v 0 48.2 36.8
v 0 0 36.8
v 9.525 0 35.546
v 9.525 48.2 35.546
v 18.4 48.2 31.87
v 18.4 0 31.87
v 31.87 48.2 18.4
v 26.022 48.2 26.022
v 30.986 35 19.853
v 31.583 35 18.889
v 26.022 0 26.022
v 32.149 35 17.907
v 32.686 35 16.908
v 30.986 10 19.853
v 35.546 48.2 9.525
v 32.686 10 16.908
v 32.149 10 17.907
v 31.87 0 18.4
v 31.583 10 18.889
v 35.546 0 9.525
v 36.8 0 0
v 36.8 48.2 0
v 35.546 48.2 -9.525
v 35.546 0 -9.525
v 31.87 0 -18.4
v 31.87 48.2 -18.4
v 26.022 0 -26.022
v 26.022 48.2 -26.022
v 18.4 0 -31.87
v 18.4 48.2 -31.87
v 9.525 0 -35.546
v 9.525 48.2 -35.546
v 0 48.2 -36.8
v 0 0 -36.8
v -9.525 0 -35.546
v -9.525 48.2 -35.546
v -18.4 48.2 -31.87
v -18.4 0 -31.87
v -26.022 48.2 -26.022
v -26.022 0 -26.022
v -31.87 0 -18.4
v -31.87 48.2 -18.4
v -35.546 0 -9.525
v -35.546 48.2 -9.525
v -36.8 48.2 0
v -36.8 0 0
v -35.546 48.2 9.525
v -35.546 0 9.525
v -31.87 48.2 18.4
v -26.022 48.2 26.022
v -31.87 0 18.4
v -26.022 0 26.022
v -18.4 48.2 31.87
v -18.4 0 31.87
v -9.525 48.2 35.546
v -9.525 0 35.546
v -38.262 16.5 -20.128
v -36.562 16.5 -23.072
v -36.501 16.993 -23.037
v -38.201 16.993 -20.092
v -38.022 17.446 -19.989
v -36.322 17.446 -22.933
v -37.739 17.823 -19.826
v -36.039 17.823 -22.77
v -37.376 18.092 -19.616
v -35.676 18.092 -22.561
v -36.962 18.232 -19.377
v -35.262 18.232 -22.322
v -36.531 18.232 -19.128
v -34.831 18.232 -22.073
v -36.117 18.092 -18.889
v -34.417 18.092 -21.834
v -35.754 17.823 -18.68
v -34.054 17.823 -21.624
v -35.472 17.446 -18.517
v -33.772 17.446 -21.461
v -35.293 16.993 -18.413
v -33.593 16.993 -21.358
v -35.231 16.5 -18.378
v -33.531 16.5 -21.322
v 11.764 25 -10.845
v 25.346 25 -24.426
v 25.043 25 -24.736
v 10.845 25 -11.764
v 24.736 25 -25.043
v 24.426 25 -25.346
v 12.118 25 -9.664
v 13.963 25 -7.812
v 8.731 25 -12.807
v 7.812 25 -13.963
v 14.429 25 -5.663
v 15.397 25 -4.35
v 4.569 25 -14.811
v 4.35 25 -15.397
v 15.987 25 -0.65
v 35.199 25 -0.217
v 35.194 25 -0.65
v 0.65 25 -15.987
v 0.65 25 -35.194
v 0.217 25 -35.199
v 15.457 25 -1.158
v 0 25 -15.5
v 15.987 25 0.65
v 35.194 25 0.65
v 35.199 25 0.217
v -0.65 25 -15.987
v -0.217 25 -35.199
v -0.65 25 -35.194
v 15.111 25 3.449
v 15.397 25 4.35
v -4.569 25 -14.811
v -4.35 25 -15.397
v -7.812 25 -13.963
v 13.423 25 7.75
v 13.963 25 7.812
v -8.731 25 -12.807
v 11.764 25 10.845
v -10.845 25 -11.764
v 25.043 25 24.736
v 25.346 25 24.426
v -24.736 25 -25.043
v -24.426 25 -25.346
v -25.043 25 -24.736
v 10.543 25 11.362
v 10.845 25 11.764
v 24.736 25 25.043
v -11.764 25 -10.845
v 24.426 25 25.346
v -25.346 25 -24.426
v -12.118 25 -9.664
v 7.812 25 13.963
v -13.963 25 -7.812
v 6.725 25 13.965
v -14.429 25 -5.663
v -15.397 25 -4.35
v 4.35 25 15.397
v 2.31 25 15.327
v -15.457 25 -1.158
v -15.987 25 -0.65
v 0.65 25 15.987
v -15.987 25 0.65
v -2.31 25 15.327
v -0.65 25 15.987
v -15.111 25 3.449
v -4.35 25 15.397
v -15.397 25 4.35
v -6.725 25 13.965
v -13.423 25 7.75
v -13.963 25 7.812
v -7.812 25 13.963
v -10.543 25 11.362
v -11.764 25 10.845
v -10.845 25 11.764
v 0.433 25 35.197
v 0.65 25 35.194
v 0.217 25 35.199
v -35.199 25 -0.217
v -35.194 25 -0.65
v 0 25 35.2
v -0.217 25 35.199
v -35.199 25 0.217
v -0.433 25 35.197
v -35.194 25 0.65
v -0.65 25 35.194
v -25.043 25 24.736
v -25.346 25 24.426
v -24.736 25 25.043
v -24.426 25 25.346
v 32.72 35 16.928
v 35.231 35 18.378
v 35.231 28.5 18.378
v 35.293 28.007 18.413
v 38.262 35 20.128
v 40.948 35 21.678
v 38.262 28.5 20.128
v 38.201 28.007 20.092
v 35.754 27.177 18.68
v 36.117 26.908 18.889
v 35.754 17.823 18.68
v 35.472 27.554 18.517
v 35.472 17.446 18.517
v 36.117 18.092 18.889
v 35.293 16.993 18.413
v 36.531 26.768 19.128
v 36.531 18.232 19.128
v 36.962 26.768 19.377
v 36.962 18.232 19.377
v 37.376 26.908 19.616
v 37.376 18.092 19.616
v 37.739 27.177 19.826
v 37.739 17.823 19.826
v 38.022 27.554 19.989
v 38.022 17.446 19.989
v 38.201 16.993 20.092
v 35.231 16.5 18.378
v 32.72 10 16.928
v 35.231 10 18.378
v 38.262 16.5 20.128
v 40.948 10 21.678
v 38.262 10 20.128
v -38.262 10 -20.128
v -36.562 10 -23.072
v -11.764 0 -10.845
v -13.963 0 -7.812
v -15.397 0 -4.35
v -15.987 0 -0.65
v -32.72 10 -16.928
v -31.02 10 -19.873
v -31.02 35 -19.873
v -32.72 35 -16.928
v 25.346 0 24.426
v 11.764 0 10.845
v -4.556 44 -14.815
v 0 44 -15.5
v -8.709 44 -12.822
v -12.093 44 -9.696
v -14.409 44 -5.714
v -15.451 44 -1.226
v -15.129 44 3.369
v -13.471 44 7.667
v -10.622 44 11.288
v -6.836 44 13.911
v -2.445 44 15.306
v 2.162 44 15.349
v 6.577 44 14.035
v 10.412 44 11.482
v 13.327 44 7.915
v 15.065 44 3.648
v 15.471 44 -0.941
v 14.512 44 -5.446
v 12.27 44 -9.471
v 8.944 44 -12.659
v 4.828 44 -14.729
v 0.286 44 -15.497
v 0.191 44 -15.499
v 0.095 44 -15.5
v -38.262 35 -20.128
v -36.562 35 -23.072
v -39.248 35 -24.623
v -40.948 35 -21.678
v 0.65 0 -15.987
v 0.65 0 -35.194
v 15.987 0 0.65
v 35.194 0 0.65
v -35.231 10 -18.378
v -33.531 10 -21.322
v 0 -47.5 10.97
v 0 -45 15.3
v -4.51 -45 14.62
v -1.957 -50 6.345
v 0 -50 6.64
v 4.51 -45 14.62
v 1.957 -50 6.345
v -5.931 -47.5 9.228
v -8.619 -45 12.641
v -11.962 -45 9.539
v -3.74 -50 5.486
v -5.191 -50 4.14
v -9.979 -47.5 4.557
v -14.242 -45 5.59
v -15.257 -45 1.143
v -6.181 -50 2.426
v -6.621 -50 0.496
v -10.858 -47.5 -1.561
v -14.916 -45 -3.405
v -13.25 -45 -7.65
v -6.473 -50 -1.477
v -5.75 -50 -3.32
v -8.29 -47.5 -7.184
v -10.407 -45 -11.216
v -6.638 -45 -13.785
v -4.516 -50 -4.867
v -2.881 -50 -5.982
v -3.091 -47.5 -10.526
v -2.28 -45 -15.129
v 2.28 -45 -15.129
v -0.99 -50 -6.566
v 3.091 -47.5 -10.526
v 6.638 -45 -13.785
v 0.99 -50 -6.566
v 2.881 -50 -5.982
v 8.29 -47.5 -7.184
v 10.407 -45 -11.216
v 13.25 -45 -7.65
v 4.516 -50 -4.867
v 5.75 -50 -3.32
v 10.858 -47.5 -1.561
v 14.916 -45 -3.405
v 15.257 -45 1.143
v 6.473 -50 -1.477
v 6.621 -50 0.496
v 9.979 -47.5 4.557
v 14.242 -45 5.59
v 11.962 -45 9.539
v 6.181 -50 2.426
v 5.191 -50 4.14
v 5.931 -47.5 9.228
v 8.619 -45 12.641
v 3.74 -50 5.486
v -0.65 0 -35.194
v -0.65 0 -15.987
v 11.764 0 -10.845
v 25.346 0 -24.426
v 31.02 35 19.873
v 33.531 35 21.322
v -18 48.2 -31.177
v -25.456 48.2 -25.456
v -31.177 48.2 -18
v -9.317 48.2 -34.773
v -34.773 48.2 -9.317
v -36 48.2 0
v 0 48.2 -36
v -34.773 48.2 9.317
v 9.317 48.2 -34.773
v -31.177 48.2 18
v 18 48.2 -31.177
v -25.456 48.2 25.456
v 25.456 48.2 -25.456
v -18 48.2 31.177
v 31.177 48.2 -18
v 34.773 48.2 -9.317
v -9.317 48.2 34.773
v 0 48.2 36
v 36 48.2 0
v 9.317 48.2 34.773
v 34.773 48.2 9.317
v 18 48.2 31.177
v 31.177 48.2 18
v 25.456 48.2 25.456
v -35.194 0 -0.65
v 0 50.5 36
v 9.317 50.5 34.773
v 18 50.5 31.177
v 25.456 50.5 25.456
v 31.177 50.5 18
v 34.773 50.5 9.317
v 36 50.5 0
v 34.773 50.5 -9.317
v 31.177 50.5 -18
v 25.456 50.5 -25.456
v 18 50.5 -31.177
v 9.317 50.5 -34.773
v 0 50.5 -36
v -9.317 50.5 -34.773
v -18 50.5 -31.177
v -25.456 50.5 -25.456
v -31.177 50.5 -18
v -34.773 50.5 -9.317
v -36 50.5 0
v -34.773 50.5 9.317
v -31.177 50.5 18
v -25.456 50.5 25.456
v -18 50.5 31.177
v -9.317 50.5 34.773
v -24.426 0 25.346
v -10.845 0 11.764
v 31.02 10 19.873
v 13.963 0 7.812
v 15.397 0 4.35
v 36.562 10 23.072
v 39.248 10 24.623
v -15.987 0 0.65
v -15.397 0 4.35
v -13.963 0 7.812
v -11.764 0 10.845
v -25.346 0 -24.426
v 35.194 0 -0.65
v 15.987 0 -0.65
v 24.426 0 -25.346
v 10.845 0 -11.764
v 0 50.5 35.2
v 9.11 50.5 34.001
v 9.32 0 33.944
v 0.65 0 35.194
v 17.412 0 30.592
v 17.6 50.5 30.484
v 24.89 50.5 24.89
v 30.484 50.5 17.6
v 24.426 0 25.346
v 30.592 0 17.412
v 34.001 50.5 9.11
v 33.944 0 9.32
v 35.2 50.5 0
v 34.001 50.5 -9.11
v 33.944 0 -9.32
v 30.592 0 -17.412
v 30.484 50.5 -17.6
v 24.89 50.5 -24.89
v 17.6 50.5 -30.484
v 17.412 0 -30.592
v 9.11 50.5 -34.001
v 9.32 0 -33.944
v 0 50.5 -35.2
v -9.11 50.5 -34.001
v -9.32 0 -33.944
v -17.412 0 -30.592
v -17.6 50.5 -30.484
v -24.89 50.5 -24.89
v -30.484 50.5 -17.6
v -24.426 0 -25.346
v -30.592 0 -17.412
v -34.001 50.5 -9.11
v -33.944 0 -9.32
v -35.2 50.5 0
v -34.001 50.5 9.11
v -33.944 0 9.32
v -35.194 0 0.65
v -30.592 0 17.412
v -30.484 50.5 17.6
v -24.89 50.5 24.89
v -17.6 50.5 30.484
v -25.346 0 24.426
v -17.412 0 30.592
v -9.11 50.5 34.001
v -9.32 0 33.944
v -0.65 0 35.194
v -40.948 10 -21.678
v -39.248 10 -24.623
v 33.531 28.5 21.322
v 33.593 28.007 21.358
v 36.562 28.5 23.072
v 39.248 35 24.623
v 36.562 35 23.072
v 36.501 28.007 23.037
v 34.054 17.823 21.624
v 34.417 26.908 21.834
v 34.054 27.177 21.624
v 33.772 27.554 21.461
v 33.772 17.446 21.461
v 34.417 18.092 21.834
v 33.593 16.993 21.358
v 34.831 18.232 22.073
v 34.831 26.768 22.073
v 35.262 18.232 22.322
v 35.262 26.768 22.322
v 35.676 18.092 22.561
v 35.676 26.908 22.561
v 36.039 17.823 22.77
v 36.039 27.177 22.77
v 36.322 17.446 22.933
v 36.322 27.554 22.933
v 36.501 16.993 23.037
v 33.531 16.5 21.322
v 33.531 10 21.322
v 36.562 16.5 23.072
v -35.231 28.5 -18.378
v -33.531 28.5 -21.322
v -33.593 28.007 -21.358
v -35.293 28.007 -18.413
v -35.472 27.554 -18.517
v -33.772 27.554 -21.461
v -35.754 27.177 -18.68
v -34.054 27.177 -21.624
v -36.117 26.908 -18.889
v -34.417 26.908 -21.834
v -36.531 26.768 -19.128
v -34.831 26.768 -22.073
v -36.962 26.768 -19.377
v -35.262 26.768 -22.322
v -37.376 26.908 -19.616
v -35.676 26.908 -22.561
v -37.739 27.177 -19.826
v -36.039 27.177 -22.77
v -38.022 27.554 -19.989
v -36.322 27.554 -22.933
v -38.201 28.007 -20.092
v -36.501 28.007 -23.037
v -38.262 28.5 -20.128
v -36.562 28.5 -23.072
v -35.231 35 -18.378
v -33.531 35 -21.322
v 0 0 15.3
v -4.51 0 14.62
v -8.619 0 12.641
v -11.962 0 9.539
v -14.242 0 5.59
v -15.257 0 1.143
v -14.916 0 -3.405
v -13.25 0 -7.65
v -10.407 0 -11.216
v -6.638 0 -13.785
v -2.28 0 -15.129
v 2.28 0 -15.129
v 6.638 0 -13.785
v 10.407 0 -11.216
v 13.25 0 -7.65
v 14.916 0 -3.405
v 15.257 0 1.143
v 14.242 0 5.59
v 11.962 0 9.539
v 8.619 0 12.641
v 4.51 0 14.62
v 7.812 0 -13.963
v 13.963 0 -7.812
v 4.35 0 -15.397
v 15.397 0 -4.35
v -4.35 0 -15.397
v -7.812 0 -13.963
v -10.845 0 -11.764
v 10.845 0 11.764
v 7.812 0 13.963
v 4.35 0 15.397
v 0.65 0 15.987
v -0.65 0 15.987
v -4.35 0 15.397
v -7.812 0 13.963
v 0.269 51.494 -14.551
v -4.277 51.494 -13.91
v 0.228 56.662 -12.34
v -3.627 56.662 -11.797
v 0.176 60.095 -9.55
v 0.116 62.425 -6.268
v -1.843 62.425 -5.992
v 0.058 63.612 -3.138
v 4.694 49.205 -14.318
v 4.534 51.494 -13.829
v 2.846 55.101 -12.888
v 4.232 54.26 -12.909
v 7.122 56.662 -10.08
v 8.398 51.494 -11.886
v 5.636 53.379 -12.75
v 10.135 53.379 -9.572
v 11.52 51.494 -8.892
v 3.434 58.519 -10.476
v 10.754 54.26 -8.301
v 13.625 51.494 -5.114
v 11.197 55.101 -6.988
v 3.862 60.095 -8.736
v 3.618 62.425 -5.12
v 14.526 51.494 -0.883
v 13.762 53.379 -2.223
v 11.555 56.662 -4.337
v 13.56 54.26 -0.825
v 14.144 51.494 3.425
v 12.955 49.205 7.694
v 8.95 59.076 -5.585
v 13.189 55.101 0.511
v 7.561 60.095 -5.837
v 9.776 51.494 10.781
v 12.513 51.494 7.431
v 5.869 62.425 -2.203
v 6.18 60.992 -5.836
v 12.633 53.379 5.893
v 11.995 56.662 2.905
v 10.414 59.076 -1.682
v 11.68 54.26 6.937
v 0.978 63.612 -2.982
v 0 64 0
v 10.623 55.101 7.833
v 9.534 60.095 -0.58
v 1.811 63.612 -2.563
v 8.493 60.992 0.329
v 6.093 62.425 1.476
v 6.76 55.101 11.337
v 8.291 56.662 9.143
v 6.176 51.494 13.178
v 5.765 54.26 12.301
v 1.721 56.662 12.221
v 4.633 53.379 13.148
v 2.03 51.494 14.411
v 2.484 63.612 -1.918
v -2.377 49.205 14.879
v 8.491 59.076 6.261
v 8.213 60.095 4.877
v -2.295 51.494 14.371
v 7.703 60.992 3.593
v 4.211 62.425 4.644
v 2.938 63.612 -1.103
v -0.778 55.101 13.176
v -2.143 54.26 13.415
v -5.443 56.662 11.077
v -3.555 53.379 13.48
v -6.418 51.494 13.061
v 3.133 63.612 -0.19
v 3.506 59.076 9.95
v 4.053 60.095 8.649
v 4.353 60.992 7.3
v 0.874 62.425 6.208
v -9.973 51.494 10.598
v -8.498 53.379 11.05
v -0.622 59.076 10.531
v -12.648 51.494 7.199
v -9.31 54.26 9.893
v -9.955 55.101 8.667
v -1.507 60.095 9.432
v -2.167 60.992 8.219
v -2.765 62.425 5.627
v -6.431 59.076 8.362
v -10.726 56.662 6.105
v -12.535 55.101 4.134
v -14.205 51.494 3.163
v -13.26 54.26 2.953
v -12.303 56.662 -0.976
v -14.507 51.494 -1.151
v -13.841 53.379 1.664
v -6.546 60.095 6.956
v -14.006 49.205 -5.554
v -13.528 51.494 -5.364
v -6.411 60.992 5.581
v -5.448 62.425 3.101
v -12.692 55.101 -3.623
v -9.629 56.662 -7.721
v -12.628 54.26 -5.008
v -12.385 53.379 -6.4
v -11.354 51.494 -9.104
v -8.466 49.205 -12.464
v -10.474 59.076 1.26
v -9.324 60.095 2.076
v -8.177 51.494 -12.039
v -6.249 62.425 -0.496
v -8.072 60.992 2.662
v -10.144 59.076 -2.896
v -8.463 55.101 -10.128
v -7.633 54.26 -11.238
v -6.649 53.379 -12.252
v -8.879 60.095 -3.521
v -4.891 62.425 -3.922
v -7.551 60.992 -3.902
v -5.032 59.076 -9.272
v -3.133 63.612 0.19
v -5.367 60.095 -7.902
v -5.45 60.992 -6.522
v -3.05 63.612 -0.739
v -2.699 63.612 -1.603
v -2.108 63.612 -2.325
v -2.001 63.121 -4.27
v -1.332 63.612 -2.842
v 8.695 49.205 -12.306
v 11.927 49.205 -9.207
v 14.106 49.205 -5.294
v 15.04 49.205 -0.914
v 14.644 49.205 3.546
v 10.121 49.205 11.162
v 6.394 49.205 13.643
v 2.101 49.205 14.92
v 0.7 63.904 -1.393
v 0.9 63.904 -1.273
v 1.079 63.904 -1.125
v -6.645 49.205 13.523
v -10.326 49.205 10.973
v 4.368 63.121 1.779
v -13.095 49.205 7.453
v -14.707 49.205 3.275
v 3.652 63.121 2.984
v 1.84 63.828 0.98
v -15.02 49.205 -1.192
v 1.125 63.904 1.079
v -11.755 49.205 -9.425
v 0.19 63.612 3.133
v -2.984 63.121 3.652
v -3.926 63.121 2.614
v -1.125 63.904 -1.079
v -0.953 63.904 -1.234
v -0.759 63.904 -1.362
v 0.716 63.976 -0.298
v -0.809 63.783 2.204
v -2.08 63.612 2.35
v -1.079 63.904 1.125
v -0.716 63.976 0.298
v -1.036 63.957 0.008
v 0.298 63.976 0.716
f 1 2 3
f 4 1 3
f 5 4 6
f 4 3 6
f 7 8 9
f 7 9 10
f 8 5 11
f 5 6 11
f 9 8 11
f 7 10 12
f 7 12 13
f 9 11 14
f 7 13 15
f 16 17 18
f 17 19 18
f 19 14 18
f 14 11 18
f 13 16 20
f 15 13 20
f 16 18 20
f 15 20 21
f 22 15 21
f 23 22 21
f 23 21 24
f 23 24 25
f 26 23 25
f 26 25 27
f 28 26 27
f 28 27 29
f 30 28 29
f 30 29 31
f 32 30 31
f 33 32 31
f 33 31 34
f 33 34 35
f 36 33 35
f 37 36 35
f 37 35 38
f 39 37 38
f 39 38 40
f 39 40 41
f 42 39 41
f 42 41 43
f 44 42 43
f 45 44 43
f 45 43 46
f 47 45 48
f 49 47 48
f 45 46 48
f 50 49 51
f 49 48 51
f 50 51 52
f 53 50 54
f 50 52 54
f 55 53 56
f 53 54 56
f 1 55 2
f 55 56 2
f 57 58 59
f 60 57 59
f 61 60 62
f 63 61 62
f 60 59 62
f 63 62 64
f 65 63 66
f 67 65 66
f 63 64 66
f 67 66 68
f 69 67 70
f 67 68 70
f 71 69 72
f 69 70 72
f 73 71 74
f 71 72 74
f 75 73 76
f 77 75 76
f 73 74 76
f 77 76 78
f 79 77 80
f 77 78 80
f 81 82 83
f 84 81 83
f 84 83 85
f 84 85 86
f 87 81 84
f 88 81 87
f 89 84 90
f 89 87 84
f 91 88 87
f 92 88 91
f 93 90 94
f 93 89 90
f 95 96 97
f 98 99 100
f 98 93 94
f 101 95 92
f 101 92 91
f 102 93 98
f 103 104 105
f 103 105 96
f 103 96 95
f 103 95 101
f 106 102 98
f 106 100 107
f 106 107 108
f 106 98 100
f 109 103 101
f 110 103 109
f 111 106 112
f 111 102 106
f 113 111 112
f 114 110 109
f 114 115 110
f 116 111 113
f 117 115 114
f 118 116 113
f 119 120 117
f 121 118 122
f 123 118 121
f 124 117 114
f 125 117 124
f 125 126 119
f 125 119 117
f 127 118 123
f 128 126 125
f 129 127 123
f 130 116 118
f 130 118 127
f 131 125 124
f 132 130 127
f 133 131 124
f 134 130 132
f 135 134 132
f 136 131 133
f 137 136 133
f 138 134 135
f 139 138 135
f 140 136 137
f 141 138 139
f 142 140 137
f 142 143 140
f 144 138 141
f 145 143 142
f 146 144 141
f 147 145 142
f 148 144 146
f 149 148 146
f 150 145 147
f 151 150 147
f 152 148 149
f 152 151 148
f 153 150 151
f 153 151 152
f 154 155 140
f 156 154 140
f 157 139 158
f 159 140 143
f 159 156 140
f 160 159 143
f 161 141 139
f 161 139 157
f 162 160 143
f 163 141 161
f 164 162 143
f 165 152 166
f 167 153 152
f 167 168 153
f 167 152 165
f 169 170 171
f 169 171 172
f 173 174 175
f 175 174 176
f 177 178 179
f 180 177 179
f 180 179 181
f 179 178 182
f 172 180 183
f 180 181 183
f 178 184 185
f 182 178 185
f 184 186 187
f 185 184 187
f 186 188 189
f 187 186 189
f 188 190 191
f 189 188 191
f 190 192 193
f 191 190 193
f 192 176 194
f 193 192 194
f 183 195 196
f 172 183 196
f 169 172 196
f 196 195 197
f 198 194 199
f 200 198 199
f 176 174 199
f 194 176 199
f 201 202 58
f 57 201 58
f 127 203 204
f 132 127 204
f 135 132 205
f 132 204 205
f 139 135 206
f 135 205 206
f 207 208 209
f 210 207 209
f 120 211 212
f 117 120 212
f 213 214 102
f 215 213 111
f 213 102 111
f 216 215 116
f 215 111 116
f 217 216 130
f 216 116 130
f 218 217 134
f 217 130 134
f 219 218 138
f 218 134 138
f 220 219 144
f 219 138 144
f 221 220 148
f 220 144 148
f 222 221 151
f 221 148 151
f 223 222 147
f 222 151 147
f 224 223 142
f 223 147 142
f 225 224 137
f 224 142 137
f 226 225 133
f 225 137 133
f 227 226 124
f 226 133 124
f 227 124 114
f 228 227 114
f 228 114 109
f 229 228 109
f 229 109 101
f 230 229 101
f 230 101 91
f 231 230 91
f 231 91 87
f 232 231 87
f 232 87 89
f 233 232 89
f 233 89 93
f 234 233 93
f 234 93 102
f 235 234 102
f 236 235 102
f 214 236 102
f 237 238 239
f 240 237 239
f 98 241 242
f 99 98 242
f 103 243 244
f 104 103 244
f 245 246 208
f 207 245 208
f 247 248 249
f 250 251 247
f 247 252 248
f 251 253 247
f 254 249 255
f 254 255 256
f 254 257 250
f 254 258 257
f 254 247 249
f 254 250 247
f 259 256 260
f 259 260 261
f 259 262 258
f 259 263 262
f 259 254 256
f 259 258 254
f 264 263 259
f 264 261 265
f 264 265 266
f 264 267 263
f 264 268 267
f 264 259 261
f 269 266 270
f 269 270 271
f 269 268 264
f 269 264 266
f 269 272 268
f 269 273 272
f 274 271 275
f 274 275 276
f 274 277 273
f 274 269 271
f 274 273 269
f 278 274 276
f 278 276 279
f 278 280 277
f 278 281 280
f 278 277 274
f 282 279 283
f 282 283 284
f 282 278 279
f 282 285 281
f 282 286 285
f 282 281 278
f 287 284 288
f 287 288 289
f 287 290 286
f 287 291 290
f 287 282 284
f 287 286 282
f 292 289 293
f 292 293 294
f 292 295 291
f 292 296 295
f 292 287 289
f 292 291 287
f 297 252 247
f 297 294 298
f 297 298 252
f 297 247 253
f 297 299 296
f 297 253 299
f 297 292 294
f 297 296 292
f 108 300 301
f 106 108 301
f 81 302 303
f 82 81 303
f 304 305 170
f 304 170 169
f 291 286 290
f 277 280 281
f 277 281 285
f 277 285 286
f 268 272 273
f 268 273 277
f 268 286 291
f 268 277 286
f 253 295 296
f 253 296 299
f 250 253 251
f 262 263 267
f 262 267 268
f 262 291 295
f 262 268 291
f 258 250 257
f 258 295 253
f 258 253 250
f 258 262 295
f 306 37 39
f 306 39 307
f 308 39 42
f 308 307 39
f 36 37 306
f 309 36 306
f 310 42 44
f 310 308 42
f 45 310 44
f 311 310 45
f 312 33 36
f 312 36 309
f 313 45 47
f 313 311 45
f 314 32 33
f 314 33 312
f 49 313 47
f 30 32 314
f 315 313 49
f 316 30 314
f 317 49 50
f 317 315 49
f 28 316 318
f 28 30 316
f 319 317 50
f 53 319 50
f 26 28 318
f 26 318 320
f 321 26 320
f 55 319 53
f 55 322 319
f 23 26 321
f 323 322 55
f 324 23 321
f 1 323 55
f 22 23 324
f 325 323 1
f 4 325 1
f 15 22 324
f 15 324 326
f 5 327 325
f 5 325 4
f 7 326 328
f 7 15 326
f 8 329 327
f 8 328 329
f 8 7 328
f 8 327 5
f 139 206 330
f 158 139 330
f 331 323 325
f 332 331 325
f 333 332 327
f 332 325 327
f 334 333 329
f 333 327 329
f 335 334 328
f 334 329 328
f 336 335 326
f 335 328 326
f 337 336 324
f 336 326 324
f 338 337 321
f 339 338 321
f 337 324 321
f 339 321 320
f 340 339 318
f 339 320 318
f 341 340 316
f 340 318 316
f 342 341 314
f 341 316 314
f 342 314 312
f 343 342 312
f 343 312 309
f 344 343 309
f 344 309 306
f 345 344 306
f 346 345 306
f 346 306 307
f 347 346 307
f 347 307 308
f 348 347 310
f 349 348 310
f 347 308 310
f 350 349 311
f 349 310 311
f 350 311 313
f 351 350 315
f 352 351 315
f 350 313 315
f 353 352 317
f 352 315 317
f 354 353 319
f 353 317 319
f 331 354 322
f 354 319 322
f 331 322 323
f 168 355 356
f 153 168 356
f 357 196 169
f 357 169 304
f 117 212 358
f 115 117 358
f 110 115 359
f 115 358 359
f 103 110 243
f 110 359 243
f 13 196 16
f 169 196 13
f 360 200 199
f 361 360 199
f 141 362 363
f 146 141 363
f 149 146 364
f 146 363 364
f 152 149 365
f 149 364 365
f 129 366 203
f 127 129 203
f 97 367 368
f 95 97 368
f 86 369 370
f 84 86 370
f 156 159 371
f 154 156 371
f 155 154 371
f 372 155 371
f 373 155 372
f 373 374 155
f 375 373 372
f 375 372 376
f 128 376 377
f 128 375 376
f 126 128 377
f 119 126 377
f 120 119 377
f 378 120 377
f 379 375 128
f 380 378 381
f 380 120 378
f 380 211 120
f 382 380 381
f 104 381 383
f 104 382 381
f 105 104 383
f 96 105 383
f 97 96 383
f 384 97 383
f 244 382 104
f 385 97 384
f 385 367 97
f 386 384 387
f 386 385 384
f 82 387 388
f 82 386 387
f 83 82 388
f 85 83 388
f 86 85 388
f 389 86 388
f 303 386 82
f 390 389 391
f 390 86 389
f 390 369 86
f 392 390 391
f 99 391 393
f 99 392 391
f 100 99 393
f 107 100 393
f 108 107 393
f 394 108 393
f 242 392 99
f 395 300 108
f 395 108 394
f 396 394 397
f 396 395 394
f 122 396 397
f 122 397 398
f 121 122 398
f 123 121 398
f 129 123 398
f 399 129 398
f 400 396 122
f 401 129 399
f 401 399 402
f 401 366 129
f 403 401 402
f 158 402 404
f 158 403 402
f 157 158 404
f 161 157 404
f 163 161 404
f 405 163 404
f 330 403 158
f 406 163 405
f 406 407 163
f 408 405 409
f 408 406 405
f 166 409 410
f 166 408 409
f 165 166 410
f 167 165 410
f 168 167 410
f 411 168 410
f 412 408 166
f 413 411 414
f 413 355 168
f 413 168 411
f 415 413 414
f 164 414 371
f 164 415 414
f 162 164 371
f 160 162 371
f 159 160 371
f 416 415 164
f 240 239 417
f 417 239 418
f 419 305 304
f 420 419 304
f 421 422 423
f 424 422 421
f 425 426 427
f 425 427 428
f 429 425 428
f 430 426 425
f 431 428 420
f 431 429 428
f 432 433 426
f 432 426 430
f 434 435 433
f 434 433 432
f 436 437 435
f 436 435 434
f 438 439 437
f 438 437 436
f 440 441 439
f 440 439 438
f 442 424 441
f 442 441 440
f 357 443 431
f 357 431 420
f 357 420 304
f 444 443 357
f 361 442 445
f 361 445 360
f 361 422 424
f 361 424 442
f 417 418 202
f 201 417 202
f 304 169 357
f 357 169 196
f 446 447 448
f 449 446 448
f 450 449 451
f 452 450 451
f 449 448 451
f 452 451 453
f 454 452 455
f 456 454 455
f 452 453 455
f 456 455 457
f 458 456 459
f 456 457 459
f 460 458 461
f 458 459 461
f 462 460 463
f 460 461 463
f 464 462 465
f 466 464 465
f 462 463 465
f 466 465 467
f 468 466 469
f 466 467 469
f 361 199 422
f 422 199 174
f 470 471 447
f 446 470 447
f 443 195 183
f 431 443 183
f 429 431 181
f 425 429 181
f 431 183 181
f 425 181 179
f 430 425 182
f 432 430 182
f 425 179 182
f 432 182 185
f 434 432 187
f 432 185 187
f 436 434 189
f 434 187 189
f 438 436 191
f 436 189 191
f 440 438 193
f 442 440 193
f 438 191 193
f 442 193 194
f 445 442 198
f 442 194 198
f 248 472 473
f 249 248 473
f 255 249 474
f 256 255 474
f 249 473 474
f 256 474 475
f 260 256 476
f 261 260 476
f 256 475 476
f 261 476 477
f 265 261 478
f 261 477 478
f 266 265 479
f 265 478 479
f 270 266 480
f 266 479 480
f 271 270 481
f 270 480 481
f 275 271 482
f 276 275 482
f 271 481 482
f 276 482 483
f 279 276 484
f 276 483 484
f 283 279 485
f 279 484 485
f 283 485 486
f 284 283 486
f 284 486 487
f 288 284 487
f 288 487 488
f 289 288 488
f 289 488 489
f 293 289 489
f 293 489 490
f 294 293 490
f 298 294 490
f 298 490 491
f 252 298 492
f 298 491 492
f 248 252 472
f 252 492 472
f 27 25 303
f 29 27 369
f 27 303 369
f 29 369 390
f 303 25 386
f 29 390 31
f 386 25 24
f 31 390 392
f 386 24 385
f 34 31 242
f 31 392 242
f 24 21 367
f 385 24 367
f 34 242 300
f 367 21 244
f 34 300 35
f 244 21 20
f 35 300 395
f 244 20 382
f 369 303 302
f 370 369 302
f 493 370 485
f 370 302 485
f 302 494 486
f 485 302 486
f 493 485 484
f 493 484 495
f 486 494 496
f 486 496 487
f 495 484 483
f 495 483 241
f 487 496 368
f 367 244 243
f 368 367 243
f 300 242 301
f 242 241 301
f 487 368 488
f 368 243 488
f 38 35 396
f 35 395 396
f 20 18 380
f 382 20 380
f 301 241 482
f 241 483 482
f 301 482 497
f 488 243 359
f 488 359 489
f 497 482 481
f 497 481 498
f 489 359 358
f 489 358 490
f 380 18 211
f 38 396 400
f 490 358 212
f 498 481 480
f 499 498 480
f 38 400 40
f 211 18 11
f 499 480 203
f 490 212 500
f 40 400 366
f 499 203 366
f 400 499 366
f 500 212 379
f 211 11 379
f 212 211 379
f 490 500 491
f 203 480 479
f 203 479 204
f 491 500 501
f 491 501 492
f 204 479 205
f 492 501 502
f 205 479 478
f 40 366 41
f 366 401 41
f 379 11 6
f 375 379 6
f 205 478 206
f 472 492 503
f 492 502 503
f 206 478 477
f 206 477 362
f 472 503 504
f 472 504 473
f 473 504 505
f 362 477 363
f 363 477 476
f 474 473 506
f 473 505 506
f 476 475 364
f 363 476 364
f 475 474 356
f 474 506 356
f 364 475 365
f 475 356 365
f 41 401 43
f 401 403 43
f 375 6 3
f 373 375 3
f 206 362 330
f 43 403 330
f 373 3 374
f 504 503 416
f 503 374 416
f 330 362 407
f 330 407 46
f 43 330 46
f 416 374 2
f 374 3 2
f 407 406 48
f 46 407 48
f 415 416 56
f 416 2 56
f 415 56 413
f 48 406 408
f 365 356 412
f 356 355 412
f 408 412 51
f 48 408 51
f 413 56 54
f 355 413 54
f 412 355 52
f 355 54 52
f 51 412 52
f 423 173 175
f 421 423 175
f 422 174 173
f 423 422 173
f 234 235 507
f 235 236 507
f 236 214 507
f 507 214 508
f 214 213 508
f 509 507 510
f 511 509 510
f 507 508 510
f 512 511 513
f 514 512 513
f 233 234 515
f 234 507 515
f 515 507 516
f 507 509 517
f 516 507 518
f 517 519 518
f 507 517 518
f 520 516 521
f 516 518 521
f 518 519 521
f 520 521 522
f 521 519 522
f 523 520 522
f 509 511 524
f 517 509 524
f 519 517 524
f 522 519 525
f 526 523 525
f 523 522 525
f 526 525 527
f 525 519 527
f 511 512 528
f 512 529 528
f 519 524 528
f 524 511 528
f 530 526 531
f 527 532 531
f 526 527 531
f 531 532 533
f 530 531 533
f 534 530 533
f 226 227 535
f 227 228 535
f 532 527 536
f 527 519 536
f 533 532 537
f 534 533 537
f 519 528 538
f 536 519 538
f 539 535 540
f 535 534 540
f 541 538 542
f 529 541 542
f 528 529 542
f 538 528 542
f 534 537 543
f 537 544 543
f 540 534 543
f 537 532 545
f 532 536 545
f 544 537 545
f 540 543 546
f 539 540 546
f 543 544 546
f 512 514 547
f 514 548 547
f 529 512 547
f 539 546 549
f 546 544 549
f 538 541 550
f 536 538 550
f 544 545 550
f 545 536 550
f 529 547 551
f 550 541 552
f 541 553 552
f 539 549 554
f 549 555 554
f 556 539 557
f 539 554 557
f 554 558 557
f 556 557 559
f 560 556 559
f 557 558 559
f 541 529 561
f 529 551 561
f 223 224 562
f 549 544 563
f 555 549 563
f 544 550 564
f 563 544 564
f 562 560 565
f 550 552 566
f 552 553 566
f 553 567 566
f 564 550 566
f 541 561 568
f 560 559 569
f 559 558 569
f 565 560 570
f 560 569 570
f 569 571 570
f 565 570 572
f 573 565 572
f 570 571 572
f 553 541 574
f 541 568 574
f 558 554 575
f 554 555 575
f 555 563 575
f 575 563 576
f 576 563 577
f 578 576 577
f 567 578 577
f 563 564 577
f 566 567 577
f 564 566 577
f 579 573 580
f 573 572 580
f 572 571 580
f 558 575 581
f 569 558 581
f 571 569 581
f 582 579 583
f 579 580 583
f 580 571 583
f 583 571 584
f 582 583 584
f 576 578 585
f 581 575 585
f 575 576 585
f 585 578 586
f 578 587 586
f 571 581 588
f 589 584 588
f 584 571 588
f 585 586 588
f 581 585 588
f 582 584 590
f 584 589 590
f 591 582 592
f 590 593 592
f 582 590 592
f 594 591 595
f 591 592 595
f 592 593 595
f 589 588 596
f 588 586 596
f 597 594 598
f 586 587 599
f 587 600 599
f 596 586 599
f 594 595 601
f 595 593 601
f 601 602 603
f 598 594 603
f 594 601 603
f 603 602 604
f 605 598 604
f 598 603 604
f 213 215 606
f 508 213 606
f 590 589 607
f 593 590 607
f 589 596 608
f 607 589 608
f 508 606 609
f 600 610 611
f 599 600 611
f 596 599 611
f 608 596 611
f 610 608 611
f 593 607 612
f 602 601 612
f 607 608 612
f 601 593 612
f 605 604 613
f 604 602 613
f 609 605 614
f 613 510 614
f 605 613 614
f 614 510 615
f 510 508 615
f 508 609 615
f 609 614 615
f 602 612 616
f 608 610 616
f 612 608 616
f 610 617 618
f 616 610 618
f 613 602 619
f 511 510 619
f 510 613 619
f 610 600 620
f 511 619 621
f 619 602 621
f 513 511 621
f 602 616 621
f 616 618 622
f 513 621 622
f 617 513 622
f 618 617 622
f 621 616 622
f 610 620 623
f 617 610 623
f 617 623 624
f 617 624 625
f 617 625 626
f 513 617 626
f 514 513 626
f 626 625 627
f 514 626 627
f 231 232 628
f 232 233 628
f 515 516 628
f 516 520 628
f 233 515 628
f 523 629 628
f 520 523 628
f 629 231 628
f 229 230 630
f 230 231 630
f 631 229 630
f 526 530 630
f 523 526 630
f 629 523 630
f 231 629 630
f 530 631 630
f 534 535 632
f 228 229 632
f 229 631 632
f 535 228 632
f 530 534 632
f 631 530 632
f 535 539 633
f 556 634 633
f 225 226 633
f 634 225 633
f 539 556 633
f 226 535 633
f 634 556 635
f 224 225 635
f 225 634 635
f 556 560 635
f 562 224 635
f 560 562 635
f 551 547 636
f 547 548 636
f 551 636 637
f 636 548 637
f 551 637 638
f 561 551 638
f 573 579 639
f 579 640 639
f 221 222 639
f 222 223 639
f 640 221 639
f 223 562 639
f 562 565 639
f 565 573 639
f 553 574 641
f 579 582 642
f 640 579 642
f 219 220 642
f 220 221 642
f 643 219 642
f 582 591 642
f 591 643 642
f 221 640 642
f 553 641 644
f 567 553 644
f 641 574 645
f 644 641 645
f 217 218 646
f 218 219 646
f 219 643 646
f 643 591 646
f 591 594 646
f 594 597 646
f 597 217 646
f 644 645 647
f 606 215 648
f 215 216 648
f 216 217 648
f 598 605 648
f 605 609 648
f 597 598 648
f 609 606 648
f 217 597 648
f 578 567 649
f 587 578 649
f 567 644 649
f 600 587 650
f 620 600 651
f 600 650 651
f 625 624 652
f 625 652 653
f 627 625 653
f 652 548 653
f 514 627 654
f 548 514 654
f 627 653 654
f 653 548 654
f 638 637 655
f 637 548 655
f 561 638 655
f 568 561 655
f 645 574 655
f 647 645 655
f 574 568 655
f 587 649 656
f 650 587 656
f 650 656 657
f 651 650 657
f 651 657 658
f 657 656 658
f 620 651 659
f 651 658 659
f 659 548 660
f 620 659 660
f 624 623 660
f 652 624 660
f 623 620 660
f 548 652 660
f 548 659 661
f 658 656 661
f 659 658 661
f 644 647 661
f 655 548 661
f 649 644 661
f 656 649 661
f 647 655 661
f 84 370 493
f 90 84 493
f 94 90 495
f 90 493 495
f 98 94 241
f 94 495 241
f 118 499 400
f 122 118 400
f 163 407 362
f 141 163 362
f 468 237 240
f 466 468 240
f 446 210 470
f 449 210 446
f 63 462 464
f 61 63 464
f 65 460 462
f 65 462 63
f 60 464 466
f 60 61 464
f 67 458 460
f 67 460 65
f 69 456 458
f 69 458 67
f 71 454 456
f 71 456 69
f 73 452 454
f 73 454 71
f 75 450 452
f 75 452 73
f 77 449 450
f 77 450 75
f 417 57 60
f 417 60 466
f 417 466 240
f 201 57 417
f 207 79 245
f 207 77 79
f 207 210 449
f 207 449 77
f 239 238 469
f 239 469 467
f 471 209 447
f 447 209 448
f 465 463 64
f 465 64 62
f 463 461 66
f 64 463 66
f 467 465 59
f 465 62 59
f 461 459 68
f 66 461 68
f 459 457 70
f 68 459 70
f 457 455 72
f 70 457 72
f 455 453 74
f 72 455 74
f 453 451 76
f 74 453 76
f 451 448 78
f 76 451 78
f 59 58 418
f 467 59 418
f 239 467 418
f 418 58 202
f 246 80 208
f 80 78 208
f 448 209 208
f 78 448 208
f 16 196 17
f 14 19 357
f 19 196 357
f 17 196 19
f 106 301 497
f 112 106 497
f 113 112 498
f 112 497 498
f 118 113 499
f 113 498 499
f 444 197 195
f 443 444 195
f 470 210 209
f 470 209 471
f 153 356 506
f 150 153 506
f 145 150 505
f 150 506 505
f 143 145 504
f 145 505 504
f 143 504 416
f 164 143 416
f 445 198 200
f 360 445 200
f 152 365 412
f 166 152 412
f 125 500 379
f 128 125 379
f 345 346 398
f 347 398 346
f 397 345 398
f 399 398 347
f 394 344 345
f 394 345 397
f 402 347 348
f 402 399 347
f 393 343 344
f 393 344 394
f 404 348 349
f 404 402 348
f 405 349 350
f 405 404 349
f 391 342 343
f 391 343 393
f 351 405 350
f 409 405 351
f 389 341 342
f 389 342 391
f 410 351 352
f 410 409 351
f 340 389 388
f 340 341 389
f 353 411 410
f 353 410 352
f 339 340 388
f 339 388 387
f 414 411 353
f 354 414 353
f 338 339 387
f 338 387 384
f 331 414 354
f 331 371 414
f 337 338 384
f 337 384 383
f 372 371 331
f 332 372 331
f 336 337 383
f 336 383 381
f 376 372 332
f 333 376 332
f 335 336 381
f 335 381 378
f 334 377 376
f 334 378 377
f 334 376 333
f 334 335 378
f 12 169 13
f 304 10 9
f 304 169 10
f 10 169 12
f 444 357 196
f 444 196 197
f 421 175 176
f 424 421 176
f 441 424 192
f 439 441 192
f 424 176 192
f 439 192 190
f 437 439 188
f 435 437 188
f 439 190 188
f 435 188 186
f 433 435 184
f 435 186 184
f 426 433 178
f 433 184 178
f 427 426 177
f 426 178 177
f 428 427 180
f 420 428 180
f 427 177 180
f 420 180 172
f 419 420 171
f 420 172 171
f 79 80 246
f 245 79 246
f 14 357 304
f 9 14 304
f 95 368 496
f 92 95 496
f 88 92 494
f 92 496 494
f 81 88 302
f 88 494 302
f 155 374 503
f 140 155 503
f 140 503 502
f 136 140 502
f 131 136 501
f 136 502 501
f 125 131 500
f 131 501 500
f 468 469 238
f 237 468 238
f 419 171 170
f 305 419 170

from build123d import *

# Parameters (mm, degrees)
SKETCH1_R                  = 36.8
SKETCH1_R_2                = 35.2
BOSS_EXTRUDE1_DEPTH        = 50.5
SKETCH2_R                  = 15
BOSS_EXTRUDE2_DEPTH        = 25
BOSS_EXTRUDE3_DEPTH        = 1.7
BOSS_EXTRUDE3_DEPTH_BACK   = 1.7
BOSS_EXTRUDE3_2_DEPTH      = 1.7
BOSS_EXTRUDE3_2_DEPTH_BACK = 1.7
BOSS_EXTRUDE4_REACH        = 106.402
BOSS_EXTRUDE4_END_RADIUS   = 36.8
SKETCH4_W                  = 3.4
SKETCH4_H                  = 25
CUT_EXTRUDE1_START         = -2.3
SKETCH5_R                  = 36.8
SKETCH5_R_2                = 36
CUT_EXTRUDE1_DEPTH         = 2.3
SKETCH6_R                  = 15.3
BOSS_EXTRUDE5_DEPTH        = 50
CHAMFER1_SIZE              = 5
CHAMFER1_SIZE2             = 8.660254038
SKETCH7_R                  = 15.5
BOSS_EXTRUDE6_DEPTH        = 44


with BuildPart() as part:
    # Sketch1 → Boss-Extrude1 (new body)
    with BuildSketch(Plane(origin=(0, 0, 0), x_dir=(1, 0, 0), z_dir=(0, 1, 0))):
        Circle(SKETCH1_R)
        Circle(SKETCH1_R_2, mode=Mode.SUBTRACT)
    extrude(amount=BOSS_EXTRUDE1_DEPTH)

    # Sketch2 → Boss-Extrude2 (add)
    with BuildSketch(Plane.XZ):
        with BuildLine():
            Line((15.986791423, 0.65), (35.193998068, 0.65))
            ThreePointArc((35.193998068, 0.65), (35.2, 0), (35.193998068, -0.65))
            Line((35.193998068, -0.65), (15.986791423, -0.65))
            ThreePointArc((15.986791423, -0.65), (14.78207252, -6.122934918), (11.763988032, -10.844749217))
            Line((11.763988032, -10.844749217), (25.345534099, -24.426295283))
            ThreePointArc((25.345534099, -24.426295283), (24.890158698, -24.890158698), (24.426295283, -25.345534099))
            Line((24.426295283, -25.345534099), (10.844749217, -11.763988032))
            ThreePointArc((10.844749217, -11.763988032), (6.122934918, -14.78207252), (0.65, -15.986791423))
            Line((0.65, -15.986791423), (0.65, -35.193998068))
            ThreePointArc((0.65, -35.193998068), (0, -35.2), (-0.65, -35.193998068))
            Line((-0.65, -35.193998068), (-0.65, -15.986791423))
            ThreePointArc((-0.65, -15.986791423), (-6.122934918, -14.78207252), (-10.844749217, -11.763988032))
            Line((-10.844749217, -11.763988032), (-24.426295283, -25.345534099))
            ThreePointArc((-24.426295283, -25.345534099), (-24.890158698, -24.890158698), (-25.345534099, -24.426295283))
            Line((-25.345534099, -24.426295283), (-11.763988032, -10.844749217))
            ThreePointArc((-11.763988032, -10.844749217), (-14.78207252, -6.122934918), (-15.986791423, -0.65))
            Line((-15.986791423, -0.65), (-35.193998068, -0.65))
            ThreePointArc((-35.193998068, -0.65), (-35.2, 0), (-35.193998068, 0.65))
            Line((-35.193998068, 0.65), (-15.986791423, 0.65))
            ThreePointArc((-15.986791423, 0.65), (-14.78207252, 6.122934918), (-11.763988032, 10.844749217))
            Line((-11.763988032, 10.844749217), (-25.345534099, 24.426295283))
            ThreePointArc((-25.345534099, 24.426295283), (-24.890158698, 24.890158698), (-24.426295283, 25.345534099))
            Line((-24.426295283, 25.345534099), (-10.844749217, 11.763988032))
            ThreePointArc((-10.844749217, 11.763988032), (-6.122934918, 14.78207252), (-0.65, 15.986791423))
            Line((-0.65, 15.986791423), (-0.65, 35.193998068))
            ThreePointArc((-0.65, 35.193998068), (0, 35.2), (0.65, 35.193998068))
            Line((0.65, 35.193998068), (0.65, 15.986791423))
            ThreePointArc((0.65, 15.986791423), (6.122934918, 14.78207252), (10.844749217, 11.763988032))
            Line((10.844749217, 11.763988032), (24.426295283, 25.345534099))
            ThreePointArc((24.426295283, 25.345534099), (24.890158698, 24.890158698), (25.345534099, 24.426295283))
            Line((25.345534099, 24.426295283), (11.763988032, 10.844749217))
            ThreePointArc((11.763988032, 10.844749217), (14.78207252, 6.122934918), (15.986791423, 0.65))
        make_face()
        Circle(SKETCH2_R, mode=Mode.SUBTRACT)
    extrude(amount=-BOSS_EXTRUDE2_DEPTH)

    # Boss-Extrude4: up to this cylinder (the profile starts outside it)
    boss_extrude4_end = Plane(origin=(0, 22.5, 0), z_dir=(0, -1, 0)) * Cylinder(BOSS_EXTRUDE4_END_RADIUS, 287.404, mode=Mode.PRIVATE)
    # Sketch4 → Boss-Extrude4 (add, up to the surface)
    with BuildSketch(Plane(origin=(31.870424751, 0, 18.400398309), x_dir=(-0.500000000000001, 0, 0.8660254037844382), z_dir=(-0.8660254037844382, 0, -0.500000000000001)), mode=Mode.PRIVATE) as boss_extrude4_sk1:
        with Locations((0, 22.5)):
            Rectangle(SKETCH4_W, SKETCH4_H)
    boss_extrude4_tool1 = extrude(boss_extrude4_sk1.sketch, amount=BOSS_EXTRUDE4_REACH, mode=Mode.PRIVATE) - boss_extrude4_end
    add(boss_extrude4_tool1.solids().sort_by_distance((31.870425, 22.5, 18.400398))[0])

    # Sketch5 → Cut-Extrude1 (cut)
    with BuildSketch(Plane(origin=(0, 50.5, 0), x_dir=(1, 0, 0), z_dir=(0, 1, 0)).offset(CUT_EXTRUDE1_START)):
        Circle(SKETCH5_R)
        Circle(SKETCH5_R_2, mode=Mode.SUBTRACT)
    extrude(amount=CUT_EXTRUDE1_DEPTH, mode=Mode.SUBTRACT)

    # Sketch6 → Boss-Extrude5 (add)
    with BuildSketch(Plane.XZ):
        Circle(SKETCH6_R)
    extrude(amount=BOSS_EXTRUDE5_DEPTH)

    # Chamfer1
    chamfer1_edges = [part.edges().sort_by_distance(p)[0] for p in [
        (-15.3, -50, 0),
    ]]
    chamfer1_side = [part.faces().sort_by_distance(p)[0] for p in [
        (-15.3, -25, 0),
    ]]
    chamfer(chamfer1_edges, length=CHAMFER1_SIZE, length2=CHAMFER1_SIZE2, reference=chamfer1_side[0])

    # Sketch7 → Boss-Extrude6 (add)
    with BuildSketch(Plane(origin=(0, 0, 0), x_dir=(1, 0, 0), z_dir=(0, 1, 0))):
        Circle(SKETCH7_R)
    extrude(amount=BOSS_EXTRUDE6_DEPTH)

    # Sketch8 → Revolve2 (revolve)
    with BuildSketch(Plane(origin=(0, 0, 0), x_dir=(0, -1, 0), z_dir=(-0.500000000000001, 0, 0.866025403784438))):
        with BuildLine():
            Line((-44, 15.5), (-44, 0))
            Line((-44, 0), (-64, 0))
            add(Edge.make_bspline(
                [(-44, 15.5), (-57.970648209, 15.5), (-64, 7.069745011), (-64, 0)],
                knots=[0, 0, 0, 0, 1, 1, 1, 1], degree=3))
        make_face()
    revolve(axis=Axis((0, 25, 0), (0, -1, 0)))


with BuildPart() as body_2:
    # Sketch3 → Boss-Extrude3 (new, two sides: drawn at the far end of the back side and taken through both)
    with BuildSketch(Plane(origin=(0, 0, 0), x_dir=(0, -1, 0), z_dir=(-0.500000000000001, 0, 0.866025403784438)).offset(-BOSS_EXTRUDE3_DEPTH_BACK)):
        with BuildLine():
            Line((-35, 36.800796618), (-10, 36.800796618))
            Line((-10, 36.800796618), (-10, 39.7))
            Line((-10, 39.7), (-16.5, 39.7))
            ThreePointArc((-16.5, 39.7), (-18.25, 41.45), (-16.5, 43.2))
            Line((-16.5, 43.2), (-10, 43.2))
            Line((-10, 43.2), (-10, 46.300796618))
            Line((-10, 46.300796618), (-35, 46.300796618))
            Line((-35, 46.300796618), (-35, 43.2))
            Line((-35, 43.2), (-28.5, 43.2))
            ThreePointArc((-28.5, 43.2), (-26.75, 41.45), (-28.5, 39.7))
            Line((-28.5, 39.7), (-35, 39.7))
            Line((-35, 39.7), (-35, 36.800796618))
        make_face()
    extrude(amount=BOSS_EXTRUDE3_DEPTH + BOSS_EXTRUDE3_DEPTH_BACK)


with BuildPart() as body_3:
    # Sketch3 → Boss-Extrude3 2 (new, two sides: drawn at the far end of the back side and taken through both)
    with BuildSketch(Plane(origin=(0, 0, 0), x_dir=(0, -1, 0), z_dir=(-0.500000000000001, 0, 0.866025403784438)).offset(-BOSS_EXTRUDE3_2_DEPTH_BACK)):
        with BuildLine():
            Line((-16.5, -39.7), (-10, -39.7))
            Line((-10, -39.7), (-10, -36.800796618))
            Line((-10, -36.800796618), (-35, -36.800796618))
            Line((-35, -36.800796618), (-35, -39.7))
            Line((-35, -39.7), (-28.5, -39.7))
            ThreePointArc((-28.5, -39.7), (-26.75, -41.45), (-28.5, -43.2))
            Line((-28.5, -43.2), (-35, -43.2))
            Line((-35, -43.2), (-35, -46.300796618))
            Line((-35, -46.300796618), (-10, -46.300796618))
            Line((-10, -46.300796618), (-10, -43.2))
            Line((-10, -43.2), (-16.5, -43.2))
            ThreePointArc((-16.5, -43.2), (-18.25, -41.45), (-16.5, -39.7))
        make_face()
    extrude(amount=BOSS_EXTRUDE3_2_DEPTH + BOSS_EXTRUDE3_2_DEPTH_BACK)


solid = Compound([part.part, body_2.part, body_3.part])
